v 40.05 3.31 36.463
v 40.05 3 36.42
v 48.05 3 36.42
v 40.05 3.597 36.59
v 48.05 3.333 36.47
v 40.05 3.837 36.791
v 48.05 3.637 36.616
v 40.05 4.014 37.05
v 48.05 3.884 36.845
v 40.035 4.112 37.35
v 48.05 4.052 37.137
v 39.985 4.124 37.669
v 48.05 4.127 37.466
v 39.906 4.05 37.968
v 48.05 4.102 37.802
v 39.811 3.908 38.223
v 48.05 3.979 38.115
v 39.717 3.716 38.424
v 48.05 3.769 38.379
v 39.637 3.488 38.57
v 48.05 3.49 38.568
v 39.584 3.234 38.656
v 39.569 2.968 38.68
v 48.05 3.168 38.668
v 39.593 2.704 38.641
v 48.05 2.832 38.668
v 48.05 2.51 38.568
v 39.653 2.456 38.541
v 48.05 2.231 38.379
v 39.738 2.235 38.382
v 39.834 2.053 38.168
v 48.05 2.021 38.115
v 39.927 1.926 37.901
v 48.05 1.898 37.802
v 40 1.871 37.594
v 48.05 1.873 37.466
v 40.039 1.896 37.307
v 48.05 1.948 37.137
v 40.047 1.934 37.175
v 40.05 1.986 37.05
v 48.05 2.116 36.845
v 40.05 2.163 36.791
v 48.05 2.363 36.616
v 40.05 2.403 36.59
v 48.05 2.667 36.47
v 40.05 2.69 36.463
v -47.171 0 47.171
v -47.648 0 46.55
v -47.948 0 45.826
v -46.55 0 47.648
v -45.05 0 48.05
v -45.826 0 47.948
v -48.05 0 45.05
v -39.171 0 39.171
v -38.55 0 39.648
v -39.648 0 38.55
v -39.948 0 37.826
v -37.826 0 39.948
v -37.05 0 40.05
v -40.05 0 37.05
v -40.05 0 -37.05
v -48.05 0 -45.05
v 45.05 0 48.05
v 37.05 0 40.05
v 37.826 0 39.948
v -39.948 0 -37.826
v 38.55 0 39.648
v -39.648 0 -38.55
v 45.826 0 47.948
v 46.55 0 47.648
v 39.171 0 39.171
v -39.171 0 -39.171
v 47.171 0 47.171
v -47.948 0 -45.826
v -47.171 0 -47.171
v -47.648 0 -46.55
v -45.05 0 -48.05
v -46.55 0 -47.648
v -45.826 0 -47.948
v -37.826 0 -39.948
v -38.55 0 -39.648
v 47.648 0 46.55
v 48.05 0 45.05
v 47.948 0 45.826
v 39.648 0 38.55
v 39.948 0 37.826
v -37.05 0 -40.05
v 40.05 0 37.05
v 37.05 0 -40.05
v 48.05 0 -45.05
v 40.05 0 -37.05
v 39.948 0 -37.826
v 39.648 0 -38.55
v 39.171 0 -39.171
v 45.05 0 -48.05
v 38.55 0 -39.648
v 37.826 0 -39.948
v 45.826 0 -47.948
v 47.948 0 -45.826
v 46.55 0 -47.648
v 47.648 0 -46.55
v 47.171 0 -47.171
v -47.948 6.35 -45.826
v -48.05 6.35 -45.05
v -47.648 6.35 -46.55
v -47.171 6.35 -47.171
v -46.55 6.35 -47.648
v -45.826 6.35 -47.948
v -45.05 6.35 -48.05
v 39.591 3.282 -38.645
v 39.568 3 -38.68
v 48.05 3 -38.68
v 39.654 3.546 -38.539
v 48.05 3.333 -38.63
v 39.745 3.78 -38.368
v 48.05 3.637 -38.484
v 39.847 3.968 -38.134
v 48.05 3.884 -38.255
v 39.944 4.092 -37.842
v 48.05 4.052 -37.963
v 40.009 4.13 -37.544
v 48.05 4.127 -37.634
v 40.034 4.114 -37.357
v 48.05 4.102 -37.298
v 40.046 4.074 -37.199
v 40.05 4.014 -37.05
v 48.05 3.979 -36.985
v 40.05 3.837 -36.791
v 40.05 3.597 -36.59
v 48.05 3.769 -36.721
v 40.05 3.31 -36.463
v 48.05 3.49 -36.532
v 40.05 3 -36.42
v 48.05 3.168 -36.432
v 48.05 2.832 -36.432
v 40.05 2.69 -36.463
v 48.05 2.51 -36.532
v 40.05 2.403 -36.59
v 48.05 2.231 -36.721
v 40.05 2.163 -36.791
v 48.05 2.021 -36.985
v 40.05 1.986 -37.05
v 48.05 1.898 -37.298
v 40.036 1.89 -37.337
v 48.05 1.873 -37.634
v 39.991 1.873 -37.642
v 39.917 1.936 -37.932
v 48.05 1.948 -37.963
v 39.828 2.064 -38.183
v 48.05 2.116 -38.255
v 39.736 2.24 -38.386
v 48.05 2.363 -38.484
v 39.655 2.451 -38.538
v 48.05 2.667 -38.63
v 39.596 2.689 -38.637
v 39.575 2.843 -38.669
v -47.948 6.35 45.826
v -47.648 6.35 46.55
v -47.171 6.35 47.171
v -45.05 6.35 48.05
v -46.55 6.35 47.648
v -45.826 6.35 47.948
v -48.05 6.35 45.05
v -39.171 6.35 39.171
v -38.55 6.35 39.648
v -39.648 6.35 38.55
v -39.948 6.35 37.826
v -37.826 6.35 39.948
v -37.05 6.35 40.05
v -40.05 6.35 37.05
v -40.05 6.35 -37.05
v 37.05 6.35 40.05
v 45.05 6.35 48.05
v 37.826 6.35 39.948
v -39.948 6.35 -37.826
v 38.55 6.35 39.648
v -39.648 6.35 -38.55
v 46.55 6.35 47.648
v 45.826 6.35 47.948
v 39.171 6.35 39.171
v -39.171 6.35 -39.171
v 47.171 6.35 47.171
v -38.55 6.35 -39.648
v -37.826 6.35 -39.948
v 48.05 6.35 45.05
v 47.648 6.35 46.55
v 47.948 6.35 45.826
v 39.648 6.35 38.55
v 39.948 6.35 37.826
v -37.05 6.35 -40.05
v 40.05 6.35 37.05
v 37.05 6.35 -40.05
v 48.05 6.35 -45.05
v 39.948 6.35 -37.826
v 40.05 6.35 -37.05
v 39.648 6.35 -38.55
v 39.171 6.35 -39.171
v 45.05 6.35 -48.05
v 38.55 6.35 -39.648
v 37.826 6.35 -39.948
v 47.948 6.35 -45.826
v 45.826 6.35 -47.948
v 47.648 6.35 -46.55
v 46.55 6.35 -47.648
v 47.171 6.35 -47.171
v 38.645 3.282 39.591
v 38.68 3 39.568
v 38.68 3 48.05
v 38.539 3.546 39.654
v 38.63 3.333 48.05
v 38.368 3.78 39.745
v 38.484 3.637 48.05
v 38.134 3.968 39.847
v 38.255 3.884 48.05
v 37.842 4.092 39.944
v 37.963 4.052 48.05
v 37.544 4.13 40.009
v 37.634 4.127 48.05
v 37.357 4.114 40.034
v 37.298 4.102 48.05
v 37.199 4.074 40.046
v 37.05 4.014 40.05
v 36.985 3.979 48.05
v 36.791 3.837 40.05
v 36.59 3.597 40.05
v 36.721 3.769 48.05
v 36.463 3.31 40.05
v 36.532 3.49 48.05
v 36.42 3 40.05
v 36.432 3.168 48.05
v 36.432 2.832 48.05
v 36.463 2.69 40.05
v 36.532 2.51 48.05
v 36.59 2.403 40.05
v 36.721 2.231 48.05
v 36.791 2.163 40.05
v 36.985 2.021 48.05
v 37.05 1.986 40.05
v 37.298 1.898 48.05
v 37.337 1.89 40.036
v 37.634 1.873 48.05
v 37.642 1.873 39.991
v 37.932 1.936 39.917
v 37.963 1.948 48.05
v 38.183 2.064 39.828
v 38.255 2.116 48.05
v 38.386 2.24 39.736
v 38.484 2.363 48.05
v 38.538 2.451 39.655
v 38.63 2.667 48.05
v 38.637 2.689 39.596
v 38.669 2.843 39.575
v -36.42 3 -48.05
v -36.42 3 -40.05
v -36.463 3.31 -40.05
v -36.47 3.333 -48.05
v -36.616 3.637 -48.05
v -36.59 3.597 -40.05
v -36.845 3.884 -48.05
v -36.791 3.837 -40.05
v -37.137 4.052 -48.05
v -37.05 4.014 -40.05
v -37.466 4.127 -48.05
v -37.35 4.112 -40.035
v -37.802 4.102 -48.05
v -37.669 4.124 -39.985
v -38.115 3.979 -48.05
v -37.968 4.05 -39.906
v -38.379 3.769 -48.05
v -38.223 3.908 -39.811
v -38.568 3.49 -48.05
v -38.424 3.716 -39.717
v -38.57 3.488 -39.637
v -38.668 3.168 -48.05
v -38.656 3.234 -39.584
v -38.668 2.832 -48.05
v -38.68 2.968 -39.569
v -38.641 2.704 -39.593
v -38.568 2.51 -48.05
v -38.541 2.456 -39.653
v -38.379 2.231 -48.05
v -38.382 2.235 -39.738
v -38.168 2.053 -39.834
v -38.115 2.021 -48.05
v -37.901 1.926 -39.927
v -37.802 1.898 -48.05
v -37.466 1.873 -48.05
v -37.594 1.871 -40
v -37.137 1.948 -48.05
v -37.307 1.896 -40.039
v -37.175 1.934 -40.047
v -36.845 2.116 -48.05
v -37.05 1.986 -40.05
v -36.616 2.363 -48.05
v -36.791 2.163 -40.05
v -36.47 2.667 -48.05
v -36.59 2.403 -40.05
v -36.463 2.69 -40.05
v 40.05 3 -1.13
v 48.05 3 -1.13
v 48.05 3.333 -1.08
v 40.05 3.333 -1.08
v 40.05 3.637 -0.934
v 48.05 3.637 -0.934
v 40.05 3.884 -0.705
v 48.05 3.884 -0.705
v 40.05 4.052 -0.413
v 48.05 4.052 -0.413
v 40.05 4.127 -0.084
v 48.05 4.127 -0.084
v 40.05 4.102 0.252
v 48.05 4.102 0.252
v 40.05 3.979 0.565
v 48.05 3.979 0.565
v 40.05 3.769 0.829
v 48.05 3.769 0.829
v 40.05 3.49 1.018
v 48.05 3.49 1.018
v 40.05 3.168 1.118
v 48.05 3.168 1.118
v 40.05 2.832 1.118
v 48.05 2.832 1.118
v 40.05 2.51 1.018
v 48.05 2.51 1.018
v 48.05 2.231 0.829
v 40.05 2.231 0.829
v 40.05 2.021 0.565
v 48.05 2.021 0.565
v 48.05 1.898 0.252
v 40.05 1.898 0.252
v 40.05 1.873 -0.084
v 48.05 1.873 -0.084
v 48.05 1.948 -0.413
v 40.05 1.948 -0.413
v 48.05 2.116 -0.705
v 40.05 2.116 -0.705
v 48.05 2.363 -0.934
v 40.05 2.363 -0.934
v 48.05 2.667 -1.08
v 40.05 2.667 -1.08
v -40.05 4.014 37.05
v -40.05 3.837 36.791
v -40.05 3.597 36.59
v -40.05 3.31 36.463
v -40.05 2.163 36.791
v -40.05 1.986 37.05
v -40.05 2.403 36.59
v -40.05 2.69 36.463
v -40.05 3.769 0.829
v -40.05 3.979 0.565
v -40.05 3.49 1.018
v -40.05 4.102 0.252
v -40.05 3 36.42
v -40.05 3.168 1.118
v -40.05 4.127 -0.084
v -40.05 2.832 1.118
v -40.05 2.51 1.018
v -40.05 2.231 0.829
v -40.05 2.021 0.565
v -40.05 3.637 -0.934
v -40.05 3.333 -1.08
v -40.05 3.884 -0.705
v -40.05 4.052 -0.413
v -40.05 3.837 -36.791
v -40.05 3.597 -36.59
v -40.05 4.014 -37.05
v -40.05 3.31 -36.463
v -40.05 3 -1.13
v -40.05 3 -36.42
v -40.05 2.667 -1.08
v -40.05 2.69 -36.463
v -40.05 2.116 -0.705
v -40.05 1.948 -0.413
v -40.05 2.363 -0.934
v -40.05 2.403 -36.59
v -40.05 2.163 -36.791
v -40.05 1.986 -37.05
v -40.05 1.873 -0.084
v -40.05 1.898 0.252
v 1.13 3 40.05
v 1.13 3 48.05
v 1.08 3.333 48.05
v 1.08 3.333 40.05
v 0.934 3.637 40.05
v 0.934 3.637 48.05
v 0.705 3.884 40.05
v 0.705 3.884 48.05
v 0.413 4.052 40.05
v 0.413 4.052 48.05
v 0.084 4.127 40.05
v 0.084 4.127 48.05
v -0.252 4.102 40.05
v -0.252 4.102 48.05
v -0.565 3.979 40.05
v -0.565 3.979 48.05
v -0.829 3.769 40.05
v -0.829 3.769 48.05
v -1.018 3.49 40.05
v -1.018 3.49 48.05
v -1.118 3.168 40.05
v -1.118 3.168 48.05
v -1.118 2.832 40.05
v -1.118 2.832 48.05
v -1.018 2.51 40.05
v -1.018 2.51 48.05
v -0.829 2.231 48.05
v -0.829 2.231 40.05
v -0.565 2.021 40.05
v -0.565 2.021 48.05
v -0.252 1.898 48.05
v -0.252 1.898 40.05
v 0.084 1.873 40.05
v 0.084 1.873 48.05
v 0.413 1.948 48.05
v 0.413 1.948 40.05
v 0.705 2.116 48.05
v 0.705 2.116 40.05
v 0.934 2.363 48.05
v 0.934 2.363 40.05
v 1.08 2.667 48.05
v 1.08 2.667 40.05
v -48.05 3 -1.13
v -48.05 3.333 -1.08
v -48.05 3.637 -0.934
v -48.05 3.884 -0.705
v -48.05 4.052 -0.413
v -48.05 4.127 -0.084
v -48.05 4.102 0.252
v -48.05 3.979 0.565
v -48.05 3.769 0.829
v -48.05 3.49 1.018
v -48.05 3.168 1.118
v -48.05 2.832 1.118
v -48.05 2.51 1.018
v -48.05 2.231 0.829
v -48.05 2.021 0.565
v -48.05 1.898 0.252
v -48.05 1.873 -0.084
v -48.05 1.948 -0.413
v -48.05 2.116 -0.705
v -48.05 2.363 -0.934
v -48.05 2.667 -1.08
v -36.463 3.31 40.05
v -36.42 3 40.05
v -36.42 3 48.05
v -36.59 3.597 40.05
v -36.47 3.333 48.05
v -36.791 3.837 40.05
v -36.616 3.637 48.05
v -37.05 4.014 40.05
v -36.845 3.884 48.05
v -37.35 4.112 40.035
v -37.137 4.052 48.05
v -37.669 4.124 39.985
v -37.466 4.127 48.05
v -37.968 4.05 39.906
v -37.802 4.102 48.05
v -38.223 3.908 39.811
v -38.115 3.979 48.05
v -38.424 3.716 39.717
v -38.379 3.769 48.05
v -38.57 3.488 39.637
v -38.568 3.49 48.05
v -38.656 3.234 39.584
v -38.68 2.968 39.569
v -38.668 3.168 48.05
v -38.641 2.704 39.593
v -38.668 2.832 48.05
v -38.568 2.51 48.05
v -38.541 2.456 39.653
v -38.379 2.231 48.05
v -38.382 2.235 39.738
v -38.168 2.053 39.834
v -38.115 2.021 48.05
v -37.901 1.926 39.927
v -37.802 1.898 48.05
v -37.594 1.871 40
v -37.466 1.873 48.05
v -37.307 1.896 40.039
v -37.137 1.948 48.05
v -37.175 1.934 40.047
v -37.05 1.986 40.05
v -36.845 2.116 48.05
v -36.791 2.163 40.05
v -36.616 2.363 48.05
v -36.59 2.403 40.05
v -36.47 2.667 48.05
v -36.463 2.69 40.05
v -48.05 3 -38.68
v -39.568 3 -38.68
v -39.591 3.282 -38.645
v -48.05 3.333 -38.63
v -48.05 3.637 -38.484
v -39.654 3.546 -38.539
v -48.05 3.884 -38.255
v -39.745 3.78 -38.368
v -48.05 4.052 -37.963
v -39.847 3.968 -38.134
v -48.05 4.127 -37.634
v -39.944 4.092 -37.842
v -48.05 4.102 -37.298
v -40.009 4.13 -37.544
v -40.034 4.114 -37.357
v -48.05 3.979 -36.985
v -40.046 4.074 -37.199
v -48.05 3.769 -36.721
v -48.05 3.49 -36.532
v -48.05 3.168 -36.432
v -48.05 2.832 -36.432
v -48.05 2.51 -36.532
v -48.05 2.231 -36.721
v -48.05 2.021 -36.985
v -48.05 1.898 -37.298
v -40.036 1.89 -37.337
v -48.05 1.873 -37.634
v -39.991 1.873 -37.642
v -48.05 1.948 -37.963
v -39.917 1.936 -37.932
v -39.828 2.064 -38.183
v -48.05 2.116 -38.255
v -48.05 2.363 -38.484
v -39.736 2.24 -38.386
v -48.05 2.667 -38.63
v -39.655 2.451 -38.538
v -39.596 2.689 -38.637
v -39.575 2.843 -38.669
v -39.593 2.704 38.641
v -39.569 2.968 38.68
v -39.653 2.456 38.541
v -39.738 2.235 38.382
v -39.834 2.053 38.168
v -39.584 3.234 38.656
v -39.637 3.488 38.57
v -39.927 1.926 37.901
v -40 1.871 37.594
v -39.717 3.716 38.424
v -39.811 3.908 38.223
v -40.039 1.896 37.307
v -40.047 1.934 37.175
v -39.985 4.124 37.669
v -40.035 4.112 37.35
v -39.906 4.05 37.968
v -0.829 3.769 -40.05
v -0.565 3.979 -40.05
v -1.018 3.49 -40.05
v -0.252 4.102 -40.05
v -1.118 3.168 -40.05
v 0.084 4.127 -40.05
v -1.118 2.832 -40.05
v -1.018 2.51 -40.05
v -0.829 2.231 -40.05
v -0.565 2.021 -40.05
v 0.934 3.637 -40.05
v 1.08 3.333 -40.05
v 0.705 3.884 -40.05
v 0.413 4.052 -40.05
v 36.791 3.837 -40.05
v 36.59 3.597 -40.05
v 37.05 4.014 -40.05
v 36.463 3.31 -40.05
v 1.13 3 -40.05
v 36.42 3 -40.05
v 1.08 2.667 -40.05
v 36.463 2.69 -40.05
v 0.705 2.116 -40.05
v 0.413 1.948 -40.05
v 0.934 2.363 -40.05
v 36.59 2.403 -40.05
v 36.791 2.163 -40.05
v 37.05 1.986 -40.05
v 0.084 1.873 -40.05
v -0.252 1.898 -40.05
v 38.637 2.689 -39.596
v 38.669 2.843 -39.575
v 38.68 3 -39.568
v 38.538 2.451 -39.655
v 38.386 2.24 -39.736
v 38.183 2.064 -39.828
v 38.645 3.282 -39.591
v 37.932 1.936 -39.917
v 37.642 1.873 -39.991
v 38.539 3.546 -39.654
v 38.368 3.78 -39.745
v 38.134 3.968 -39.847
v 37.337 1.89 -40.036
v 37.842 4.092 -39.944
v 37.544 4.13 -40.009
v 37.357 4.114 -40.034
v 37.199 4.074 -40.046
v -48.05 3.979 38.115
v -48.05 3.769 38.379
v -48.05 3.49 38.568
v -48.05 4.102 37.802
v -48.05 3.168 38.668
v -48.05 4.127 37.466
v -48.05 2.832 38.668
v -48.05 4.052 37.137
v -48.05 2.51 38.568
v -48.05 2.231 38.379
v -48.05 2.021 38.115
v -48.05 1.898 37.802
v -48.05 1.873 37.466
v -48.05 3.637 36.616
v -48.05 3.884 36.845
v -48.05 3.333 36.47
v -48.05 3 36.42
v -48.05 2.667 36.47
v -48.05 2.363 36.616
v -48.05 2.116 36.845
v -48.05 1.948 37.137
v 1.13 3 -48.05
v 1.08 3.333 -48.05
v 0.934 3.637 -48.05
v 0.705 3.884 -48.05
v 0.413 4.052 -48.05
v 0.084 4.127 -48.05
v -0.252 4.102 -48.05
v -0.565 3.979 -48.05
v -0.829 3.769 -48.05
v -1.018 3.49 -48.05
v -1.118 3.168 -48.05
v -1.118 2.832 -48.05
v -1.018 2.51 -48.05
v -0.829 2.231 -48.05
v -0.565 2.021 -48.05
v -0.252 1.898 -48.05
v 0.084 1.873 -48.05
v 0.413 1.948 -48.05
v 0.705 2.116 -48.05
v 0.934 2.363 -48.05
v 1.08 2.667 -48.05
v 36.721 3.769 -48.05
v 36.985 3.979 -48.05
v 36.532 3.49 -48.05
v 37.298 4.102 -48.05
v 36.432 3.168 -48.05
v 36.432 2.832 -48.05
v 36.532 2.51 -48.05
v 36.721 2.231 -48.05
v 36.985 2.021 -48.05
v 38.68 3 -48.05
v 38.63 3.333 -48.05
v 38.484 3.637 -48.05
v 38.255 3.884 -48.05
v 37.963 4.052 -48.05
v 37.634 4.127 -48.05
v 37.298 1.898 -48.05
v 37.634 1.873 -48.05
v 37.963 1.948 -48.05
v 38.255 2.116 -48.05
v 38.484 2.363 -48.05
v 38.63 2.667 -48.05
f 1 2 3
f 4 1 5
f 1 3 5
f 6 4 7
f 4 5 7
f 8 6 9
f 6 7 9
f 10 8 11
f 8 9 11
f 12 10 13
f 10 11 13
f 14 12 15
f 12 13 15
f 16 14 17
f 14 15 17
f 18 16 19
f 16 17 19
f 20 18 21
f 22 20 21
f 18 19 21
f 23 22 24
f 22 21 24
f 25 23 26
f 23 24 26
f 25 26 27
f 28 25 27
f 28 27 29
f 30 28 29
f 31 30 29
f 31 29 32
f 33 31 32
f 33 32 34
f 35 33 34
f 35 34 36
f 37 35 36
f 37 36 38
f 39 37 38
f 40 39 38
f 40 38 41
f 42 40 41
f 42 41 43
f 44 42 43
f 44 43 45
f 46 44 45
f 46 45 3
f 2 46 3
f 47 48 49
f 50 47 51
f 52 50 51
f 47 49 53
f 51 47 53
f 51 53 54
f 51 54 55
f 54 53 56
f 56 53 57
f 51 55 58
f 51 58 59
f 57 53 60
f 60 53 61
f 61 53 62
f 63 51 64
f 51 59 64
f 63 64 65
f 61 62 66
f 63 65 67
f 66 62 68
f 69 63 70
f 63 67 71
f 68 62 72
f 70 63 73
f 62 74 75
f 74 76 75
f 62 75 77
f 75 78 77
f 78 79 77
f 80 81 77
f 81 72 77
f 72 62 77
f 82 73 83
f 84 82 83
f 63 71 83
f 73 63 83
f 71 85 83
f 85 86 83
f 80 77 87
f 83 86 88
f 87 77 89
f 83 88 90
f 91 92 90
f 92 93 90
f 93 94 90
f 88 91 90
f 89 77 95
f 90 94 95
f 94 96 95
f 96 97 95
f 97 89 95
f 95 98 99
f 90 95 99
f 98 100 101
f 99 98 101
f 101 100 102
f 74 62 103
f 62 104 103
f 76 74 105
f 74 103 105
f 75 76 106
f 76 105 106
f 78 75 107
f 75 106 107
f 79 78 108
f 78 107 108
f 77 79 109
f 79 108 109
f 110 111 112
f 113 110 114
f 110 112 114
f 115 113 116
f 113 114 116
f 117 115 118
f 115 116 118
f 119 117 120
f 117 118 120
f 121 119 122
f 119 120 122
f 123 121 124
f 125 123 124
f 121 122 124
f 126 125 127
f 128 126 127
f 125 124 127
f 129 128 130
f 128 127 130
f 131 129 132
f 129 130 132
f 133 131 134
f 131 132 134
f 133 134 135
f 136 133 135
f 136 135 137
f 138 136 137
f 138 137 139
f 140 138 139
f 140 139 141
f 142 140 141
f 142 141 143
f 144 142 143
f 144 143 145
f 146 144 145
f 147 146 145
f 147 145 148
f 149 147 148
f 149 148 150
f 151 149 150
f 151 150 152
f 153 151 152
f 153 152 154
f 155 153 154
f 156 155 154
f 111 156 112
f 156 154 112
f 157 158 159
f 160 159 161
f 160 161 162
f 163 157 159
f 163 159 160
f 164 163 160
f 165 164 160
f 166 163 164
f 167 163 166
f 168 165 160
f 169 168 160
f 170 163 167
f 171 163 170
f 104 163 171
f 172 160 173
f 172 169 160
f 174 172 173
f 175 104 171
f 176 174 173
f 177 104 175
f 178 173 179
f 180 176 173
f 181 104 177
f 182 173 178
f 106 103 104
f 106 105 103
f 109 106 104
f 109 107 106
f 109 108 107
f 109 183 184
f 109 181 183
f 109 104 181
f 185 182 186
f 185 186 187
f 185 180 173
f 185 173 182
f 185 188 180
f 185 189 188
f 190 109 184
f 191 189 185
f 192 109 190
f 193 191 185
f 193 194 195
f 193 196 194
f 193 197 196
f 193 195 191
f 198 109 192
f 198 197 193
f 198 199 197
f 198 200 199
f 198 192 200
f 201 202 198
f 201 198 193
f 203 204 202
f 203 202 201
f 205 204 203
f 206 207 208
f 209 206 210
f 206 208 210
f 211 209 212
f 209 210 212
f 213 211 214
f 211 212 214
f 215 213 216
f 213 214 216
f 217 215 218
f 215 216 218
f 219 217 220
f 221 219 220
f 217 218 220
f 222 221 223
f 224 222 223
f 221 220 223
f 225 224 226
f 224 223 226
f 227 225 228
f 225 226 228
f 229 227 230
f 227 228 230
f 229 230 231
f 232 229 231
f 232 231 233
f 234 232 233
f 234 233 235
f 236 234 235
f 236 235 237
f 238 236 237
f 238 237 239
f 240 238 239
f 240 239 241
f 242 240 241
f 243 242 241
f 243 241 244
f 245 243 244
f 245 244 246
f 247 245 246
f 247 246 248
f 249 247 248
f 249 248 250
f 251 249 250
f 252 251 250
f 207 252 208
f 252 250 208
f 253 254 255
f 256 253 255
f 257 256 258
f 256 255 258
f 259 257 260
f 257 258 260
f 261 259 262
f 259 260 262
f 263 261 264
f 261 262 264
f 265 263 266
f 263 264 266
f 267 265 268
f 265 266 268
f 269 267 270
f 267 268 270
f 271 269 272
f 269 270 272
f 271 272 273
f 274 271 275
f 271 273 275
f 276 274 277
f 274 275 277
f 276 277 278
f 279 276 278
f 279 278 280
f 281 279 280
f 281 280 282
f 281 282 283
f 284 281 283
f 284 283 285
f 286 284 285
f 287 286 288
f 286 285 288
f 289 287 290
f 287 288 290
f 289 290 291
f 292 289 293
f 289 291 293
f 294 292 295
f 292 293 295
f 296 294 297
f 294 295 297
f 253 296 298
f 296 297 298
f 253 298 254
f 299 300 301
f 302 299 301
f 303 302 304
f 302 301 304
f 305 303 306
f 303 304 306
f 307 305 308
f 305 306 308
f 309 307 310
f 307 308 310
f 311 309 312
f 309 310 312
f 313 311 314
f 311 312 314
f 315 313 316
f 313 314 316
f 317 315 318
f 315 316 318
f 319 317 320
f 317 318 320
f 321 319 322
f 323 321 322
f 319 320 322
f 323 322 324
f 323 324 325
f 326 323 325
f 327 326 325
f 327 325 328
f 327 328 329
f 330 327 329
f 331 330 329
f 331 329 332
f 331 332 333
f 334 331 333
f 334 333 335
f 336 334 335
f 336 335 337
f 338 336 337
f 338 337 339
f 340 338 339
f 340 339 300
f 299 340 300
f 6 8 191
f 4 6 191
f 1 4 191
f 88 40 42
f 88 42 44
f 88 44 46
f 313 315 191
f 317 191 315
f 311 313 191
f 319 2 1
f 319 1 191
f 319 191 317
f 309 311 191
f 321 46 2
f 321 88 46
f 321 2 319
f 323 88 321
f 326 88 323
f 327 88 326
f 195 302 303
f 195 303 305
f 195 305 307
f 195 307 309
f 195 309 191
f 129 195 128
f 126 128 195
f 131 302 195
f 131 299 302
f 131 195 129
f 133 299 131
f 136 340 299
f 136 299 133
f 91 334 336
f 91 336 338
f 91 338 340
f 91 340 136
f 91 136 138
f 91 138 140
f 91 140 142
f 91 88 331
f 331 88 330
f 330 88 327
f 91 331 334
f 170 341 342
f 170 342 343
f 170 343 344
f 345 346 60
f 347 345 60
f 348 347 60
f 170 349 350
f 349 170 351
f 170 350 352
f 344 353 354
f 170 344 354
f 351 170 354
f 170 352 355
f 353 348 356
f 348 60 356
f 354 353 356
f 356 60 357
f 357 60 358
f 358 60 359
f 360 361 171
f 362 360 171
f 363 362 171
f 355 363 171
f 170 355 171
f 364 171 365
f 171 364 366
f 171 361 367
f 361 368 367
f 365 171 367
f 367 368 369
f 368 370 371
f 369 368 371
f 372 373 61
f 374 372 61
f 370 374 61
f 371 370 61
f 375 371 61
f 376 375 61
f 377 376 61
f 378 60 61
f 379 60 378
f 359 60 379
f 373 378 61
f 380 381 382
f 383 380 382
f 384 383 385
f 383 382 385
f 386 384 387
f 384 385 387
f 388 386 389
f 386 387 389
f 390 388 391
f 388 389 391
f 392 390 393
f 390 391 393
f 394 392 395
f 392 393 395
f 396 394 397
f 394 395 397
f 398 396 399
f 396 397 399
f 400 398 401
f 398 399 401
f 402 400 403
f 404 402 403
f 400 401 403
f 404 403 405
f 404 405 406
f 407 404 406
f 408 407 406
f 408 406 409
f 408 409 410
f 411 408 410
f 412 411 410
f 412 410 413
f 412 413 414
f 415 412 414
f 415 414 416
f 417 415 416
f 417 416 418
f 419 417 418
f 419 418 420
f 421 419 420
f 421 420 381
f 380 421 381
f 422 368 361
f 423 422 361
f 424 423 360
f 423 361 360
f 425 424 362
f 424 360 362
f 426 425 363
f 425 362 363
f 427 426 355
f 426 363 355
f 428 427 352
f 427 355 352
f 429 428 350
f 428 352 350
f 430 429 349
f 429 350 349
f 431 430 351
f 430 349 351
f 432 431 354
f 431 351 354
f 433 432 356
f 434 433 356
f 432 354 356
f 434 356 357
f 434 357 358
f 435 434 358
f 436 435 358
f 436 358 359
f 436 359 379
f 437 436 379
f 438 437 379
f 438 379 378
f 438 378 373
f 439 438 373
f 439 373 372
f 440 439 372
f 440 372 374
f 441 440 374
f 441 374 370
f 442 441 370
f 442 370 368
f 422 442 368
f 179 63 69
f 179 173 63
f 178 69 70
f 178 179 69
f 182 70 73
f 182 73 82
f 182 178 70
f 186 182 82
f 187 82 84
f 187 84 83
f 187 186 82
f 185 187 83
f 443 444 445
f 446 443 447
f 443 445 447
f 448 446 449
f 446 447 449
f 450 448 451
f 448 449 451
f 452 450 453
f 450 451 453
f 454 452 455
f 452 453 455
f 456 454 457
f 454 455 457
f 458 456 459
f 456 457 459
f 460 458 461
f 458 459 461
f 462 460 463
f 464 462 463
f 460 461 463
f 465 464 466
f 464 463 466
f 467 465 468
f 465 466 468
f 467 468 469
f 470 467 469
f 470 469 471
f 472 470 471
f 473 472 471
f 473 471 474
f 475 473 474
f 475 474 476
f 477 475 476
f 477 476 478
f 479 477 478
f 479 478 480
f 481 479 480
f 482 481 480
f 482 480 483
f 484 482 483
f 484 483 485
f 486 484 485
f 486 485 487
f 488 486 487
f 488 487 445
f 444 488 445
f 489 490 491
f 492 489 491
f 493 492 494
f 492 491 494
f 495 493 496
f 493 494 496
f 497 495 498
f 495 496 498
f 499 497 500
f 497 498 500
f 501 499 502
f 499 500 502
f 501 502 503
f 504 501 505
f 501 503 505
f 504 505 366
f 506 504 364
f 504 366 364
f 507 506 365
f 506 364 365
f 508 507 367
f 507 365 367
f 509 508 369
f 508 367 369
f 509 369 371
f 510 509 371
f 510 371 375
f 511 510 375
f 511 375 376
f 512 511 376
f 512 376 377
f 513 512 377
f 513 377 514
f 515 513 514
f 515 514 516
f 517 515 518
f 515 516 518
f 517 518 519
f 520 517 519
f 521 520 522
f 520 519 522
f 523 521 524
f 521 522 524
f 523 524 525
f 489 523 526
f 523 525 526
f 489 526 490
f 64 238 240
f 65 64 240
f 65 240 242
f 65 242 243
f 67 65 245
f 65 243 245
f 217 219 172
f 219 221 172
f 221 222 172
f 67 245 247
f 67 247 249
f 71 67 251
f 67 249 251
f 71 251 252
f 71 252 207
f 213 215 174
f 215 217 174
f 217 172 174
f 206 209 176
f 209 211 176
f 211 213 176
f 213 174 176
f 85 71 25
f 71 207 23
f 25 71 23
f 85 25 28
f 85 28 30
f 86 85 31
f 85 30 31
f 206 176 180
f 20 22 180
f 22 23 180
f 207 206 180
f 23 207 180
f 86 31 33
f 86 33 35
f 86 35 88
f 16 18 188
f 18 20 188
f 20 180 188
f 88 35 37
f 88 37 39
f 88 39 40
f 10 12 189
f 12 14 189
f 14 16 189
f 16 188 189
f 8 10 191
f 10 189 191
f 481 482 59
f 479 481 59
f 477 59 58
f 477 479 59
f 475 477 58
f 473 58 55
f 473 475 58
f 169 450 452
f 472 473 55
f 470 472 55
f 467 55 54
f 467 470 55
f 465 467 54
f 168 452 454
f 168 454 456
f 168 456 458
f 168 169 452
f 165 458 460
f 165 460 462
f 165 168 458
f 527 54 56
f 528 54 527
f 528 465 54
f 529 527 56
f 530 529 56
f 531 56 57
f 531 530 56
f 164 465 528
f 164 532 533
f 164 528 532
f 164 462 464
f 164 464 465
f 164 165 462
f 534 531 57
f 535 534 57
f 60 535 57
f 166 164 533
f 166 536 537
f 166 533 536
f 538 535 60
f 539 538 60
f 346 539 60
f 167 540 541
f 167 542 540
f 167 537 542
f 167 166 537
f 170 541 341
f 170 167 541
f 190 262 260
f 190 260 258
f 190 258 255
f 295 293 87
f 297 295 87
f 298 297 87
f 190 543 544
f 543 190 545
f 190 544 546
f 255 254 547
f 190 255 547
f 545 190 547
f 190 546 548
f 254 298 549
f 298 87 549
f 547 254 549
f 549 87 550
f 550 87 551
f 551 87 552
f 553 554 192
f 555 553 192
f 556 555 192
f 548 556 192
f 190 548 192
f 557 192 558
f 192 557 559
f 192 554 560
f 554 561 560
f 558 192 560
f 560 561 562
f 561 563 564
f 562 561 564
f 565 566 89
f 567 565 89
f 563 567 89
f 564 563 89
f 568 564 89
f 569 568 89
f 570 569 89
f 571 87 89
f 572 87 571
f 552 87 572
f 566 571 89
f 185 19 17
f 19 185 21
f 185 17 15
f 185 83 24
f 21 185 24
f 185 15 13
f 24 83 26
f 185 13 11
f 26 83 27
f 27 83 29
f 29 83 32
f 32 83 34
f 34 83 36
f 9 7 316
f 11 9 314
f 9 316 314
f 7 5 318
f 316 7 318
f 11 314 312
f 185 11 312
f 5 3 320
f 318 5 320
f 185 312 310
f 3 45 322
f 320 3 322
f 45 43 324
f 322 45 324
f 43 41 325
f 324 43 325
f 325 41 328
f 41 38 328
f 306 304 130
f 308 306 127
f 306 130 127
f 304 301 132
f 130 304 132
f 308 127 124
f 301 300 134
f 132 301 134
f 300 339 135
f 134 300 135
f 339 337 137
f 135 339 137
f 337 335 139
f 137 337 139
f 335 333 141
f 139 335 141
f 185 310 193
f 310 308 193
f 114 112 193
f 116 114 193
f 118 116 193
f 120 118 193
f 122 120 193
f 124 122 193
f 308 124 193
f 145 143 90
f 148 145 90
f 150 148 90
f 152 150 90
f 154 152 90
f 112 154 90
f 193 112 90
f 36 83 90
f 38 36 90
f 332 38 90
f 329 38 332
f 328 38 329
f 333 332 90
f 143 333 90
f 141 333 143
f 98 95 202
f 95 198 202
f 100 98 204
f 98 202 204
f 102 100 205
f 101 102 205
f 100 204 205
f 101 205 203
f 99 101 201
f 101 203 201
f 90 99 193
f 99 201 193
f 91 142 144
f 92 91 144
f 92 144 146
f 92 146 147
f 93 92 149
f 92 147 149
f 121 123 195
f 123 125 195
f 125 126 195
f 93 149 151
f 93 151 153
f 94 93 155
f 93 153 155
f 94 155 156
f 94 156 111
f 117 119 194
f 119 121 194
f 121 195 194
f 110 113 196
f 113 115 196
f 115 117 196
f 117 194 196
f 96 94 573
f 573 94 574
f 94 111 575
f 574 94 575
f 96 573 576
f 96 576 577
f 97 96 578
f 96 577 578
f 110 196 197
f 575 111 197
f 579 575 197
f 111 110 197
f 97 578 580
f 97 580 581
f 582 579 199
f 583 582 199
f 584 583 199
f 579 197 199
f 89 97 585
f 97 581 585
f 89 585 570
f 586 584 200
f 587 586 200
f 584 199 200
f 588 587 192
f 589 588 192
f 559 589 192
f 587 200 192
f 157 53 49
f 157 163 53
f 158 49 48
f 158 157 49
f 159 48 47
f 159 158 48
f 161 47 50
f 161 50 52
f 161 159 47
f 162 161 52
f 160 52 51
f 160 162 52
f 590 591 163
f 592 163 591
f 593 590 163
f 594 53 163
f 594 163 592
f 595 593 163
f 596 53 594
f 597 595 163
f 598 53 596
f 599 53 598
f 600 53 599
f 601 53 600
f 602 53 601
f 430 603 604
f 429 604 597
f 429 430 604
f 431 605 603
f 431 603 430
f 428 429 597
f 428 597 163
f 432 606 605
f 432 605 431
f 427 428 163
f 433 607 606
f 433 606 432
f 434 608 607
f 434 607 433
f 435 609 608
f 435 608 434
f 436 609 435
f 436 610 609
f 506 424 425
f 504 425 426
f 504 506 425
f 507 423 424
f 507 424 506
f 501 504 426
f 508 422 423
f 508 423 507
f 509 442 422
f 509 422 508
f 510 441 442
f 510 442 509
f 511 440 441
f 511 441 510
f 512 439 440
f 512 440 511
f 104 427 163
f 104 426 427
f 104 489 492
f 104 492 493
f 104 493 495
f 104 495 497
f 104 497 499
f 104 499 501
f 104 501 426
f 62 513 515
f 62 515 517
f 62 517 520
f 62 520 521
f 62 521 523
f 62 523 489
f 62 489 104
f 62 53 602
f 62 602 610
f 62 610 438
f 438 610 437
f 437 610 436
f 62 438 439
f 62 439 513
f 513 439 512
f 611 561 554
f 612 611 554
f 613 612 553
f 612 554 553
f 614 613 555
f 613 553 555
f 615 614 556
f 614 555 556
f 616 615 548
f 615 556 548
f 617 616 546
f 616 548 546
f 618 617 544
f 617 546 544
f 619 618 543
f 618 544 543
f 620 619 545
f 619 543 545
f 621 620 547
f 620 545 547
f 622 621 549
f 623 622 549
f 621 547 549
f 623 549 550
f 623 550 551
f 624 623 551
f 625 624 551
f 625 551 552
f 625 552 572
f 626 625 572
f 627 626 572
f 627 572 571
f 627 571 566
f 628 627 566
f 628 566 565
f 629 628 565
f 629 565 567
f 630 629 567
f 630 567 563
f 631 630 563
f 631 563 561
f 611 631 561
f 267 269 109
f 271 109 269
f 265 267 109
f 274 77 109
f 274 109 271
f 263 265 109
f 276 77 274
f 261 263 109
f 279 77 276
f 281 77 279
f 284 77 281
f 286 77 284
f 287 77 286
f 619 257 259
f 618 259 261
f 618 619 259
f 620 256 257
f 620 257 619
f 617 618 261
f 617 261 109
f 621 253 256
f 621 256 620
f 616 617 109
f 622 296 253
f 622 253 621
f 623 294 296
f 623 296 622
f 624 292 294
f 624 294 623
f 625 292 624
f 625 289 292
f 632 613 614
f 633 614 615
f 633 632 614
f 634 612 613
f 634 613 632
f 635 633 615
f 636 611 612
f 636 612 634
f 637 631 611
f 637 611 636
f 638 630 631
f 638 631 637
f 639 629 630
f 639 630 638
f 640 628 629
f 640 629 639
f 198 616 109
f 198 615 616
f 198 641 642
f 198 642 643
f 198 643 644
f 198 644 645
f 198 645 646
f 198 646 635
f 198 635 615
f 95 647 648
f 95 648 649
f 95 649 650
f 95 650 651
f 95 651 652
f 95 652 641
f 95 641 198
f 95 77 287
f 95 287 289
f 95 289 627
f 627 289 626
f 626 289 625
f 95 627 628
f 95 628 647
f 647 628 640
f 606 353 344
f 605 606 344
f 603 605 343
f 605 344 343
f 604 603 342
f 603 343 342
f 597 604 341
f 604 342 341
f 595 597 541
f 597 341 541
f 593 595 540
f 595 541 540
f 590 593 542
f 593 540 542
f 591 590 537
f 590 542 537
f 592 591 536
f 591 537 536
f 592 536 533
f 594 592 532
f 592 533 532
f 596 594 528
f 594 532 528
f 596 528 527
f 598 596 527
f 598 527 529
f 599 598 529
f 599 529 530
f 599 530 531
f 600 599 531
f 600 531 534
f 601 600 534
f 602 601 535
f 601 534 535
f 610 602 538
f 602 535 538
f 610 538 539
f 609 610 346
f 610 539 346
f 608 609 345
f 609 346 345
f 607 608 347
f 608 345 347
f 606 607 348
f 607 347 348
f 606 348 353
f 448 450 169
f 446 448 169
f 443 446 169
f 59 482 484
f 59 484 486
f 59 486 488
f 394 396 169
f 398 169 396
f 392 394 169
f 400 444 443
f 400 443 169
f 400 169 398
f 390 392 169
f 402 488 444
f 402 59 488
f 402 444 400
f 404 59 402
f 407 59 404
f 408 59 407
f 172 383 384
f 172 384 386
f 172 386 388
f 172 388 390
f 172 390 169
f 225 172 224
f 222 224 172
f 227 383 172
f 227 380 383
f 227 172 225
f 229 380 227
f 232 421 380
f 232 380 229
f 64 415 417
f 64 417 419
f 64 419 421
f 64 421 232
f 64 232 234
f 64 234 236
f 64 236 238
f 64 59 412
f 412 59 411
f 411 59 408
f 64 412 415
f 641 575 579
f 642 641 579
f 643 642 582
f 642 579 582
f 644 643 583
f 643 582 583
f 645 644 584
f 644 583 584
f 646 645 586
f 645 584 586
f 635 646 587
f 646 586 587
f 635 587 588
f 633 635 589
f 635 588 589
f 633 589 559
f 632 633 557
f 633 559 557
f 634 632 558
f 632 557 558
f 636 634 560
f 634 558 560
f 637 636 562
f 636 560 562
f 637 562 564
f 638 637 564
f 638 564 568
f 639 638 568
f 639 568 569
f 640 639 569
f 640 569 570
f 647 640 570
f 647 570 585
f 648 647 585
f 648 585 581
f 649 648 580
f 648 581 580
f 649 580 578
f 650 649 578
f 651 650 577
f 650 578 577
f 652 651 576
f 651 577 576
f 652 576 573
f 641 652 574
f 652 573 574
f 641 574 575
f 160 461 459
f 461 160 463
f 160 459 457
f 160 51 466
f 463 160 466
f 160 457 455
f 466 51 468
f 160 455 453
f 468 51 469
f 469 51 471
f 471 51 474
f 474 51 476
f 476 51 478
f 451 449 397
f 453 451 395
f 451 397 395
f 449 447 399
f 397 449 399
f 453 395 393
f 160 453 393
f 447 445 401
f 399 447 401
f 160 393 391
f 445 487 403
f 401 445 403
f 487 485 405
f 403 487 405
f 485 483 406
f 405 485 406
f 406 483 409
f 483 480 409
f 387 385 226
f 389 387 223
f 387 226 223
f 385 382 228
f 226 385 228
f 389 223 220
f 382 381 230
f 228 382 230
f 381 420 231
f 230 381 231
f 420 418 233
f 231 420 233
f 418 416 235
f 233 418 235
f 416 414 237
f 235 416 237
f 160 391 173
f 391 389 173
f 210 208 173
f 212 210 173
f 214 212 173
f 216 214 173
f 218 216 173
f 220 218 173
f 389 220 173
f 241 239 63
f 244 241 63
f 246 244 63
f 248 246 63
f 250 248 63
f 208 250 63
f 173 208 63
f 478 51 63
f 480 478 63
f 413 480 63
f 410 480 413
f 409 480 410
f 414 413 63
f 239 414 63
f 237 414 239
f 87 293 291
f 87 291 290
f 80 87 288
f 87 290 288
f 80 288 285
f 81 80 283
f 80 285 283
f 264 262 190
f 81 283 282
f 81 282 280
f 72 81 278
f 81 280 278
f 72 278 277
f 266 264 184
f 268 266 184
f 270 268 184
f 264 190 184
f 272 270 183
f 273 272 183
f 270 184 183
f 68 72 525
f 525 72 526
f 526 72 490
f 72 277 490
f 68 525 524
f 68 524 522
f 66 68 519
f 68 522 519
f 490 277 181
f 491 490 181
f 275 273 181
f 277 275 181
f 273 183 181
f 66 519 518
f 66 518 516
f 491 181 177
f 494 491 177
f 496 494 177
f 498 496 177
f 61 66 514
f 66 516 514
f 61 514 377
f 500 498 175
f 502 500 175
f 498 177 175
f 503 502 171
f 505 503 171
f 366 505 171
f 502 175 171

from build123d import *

# Parameters (mm, degrees)
SKETCH1_W                   = 96.1
SKETCH1_H                   = 96.1
SKETCH1_W_2                 = 80.1
SKETCH1_H_2                 = 80.1
BOSS_EXTRUDE1_DEPTH         = 6.35
FILLET1_R                   = 3
F_43_0_089_DIAMETER_HOLE1_D = 2.2606
F_43_0_089_DIAMETER_HOLE2_D = 2.2606


with BuildPart() as part:
    # Sketch1 → Boss-Extrude1 (new body)
    with BuildSketch(Plane(origin=(0, 0, 0), x_dir=(1, 0, 0), z_dir=(0, 1, 0))):
        Rectangle(SKETCH1_W, SKETCH1_H)
        Rectangle(SKETCH1_W_2, SKETCH1_H_2, mode=Mode.SUBTRACT)
    extrude(amount=BOSS_EXTRUDE1_DEPTH)

    # Fillet1
    fillet1_edges = [part.edges().sort_by_distance(p)[0] for p in [
        (-40.05, 3.175, 40.05),
        (40.05, 3.175, 40.05),
        (40.05, 3.175, -40.05),
        (-40.05, 3.175, -40.05),
        (-48.05, 3.175, -48.05),
        (48.05, 3.175, -48.05),
        (48.05, 3.175, 48.05),
        (-48.05, 3.175, 48.05),
    ]]
    fillet(fillet1_edges, radius=FILLET1_R)

    # #43 (0.089) Diameter Hole1 (through all)
    with Locations(Plane(origin=(0, 0, -48.05), x_dir=(-1, 0, 0), z_dir=(0, 0, -1))):
        with Locations((0, 3), (-37.55, 3), (37.55, 3)):
            Hole(F_43_0_089_DIAMETER_HOLE1_D / 2)

    # #43 (0.089) Diameter Hole2 (through all)
    with Locations(Plane.ZY.offset(48.05)):
        with Locations((0, 3), (-37.55, 3), (37.55, 3)):
            Hole(F_43_0_089_DIAMETER_HOLE2_D / 2)


solid = part.part
